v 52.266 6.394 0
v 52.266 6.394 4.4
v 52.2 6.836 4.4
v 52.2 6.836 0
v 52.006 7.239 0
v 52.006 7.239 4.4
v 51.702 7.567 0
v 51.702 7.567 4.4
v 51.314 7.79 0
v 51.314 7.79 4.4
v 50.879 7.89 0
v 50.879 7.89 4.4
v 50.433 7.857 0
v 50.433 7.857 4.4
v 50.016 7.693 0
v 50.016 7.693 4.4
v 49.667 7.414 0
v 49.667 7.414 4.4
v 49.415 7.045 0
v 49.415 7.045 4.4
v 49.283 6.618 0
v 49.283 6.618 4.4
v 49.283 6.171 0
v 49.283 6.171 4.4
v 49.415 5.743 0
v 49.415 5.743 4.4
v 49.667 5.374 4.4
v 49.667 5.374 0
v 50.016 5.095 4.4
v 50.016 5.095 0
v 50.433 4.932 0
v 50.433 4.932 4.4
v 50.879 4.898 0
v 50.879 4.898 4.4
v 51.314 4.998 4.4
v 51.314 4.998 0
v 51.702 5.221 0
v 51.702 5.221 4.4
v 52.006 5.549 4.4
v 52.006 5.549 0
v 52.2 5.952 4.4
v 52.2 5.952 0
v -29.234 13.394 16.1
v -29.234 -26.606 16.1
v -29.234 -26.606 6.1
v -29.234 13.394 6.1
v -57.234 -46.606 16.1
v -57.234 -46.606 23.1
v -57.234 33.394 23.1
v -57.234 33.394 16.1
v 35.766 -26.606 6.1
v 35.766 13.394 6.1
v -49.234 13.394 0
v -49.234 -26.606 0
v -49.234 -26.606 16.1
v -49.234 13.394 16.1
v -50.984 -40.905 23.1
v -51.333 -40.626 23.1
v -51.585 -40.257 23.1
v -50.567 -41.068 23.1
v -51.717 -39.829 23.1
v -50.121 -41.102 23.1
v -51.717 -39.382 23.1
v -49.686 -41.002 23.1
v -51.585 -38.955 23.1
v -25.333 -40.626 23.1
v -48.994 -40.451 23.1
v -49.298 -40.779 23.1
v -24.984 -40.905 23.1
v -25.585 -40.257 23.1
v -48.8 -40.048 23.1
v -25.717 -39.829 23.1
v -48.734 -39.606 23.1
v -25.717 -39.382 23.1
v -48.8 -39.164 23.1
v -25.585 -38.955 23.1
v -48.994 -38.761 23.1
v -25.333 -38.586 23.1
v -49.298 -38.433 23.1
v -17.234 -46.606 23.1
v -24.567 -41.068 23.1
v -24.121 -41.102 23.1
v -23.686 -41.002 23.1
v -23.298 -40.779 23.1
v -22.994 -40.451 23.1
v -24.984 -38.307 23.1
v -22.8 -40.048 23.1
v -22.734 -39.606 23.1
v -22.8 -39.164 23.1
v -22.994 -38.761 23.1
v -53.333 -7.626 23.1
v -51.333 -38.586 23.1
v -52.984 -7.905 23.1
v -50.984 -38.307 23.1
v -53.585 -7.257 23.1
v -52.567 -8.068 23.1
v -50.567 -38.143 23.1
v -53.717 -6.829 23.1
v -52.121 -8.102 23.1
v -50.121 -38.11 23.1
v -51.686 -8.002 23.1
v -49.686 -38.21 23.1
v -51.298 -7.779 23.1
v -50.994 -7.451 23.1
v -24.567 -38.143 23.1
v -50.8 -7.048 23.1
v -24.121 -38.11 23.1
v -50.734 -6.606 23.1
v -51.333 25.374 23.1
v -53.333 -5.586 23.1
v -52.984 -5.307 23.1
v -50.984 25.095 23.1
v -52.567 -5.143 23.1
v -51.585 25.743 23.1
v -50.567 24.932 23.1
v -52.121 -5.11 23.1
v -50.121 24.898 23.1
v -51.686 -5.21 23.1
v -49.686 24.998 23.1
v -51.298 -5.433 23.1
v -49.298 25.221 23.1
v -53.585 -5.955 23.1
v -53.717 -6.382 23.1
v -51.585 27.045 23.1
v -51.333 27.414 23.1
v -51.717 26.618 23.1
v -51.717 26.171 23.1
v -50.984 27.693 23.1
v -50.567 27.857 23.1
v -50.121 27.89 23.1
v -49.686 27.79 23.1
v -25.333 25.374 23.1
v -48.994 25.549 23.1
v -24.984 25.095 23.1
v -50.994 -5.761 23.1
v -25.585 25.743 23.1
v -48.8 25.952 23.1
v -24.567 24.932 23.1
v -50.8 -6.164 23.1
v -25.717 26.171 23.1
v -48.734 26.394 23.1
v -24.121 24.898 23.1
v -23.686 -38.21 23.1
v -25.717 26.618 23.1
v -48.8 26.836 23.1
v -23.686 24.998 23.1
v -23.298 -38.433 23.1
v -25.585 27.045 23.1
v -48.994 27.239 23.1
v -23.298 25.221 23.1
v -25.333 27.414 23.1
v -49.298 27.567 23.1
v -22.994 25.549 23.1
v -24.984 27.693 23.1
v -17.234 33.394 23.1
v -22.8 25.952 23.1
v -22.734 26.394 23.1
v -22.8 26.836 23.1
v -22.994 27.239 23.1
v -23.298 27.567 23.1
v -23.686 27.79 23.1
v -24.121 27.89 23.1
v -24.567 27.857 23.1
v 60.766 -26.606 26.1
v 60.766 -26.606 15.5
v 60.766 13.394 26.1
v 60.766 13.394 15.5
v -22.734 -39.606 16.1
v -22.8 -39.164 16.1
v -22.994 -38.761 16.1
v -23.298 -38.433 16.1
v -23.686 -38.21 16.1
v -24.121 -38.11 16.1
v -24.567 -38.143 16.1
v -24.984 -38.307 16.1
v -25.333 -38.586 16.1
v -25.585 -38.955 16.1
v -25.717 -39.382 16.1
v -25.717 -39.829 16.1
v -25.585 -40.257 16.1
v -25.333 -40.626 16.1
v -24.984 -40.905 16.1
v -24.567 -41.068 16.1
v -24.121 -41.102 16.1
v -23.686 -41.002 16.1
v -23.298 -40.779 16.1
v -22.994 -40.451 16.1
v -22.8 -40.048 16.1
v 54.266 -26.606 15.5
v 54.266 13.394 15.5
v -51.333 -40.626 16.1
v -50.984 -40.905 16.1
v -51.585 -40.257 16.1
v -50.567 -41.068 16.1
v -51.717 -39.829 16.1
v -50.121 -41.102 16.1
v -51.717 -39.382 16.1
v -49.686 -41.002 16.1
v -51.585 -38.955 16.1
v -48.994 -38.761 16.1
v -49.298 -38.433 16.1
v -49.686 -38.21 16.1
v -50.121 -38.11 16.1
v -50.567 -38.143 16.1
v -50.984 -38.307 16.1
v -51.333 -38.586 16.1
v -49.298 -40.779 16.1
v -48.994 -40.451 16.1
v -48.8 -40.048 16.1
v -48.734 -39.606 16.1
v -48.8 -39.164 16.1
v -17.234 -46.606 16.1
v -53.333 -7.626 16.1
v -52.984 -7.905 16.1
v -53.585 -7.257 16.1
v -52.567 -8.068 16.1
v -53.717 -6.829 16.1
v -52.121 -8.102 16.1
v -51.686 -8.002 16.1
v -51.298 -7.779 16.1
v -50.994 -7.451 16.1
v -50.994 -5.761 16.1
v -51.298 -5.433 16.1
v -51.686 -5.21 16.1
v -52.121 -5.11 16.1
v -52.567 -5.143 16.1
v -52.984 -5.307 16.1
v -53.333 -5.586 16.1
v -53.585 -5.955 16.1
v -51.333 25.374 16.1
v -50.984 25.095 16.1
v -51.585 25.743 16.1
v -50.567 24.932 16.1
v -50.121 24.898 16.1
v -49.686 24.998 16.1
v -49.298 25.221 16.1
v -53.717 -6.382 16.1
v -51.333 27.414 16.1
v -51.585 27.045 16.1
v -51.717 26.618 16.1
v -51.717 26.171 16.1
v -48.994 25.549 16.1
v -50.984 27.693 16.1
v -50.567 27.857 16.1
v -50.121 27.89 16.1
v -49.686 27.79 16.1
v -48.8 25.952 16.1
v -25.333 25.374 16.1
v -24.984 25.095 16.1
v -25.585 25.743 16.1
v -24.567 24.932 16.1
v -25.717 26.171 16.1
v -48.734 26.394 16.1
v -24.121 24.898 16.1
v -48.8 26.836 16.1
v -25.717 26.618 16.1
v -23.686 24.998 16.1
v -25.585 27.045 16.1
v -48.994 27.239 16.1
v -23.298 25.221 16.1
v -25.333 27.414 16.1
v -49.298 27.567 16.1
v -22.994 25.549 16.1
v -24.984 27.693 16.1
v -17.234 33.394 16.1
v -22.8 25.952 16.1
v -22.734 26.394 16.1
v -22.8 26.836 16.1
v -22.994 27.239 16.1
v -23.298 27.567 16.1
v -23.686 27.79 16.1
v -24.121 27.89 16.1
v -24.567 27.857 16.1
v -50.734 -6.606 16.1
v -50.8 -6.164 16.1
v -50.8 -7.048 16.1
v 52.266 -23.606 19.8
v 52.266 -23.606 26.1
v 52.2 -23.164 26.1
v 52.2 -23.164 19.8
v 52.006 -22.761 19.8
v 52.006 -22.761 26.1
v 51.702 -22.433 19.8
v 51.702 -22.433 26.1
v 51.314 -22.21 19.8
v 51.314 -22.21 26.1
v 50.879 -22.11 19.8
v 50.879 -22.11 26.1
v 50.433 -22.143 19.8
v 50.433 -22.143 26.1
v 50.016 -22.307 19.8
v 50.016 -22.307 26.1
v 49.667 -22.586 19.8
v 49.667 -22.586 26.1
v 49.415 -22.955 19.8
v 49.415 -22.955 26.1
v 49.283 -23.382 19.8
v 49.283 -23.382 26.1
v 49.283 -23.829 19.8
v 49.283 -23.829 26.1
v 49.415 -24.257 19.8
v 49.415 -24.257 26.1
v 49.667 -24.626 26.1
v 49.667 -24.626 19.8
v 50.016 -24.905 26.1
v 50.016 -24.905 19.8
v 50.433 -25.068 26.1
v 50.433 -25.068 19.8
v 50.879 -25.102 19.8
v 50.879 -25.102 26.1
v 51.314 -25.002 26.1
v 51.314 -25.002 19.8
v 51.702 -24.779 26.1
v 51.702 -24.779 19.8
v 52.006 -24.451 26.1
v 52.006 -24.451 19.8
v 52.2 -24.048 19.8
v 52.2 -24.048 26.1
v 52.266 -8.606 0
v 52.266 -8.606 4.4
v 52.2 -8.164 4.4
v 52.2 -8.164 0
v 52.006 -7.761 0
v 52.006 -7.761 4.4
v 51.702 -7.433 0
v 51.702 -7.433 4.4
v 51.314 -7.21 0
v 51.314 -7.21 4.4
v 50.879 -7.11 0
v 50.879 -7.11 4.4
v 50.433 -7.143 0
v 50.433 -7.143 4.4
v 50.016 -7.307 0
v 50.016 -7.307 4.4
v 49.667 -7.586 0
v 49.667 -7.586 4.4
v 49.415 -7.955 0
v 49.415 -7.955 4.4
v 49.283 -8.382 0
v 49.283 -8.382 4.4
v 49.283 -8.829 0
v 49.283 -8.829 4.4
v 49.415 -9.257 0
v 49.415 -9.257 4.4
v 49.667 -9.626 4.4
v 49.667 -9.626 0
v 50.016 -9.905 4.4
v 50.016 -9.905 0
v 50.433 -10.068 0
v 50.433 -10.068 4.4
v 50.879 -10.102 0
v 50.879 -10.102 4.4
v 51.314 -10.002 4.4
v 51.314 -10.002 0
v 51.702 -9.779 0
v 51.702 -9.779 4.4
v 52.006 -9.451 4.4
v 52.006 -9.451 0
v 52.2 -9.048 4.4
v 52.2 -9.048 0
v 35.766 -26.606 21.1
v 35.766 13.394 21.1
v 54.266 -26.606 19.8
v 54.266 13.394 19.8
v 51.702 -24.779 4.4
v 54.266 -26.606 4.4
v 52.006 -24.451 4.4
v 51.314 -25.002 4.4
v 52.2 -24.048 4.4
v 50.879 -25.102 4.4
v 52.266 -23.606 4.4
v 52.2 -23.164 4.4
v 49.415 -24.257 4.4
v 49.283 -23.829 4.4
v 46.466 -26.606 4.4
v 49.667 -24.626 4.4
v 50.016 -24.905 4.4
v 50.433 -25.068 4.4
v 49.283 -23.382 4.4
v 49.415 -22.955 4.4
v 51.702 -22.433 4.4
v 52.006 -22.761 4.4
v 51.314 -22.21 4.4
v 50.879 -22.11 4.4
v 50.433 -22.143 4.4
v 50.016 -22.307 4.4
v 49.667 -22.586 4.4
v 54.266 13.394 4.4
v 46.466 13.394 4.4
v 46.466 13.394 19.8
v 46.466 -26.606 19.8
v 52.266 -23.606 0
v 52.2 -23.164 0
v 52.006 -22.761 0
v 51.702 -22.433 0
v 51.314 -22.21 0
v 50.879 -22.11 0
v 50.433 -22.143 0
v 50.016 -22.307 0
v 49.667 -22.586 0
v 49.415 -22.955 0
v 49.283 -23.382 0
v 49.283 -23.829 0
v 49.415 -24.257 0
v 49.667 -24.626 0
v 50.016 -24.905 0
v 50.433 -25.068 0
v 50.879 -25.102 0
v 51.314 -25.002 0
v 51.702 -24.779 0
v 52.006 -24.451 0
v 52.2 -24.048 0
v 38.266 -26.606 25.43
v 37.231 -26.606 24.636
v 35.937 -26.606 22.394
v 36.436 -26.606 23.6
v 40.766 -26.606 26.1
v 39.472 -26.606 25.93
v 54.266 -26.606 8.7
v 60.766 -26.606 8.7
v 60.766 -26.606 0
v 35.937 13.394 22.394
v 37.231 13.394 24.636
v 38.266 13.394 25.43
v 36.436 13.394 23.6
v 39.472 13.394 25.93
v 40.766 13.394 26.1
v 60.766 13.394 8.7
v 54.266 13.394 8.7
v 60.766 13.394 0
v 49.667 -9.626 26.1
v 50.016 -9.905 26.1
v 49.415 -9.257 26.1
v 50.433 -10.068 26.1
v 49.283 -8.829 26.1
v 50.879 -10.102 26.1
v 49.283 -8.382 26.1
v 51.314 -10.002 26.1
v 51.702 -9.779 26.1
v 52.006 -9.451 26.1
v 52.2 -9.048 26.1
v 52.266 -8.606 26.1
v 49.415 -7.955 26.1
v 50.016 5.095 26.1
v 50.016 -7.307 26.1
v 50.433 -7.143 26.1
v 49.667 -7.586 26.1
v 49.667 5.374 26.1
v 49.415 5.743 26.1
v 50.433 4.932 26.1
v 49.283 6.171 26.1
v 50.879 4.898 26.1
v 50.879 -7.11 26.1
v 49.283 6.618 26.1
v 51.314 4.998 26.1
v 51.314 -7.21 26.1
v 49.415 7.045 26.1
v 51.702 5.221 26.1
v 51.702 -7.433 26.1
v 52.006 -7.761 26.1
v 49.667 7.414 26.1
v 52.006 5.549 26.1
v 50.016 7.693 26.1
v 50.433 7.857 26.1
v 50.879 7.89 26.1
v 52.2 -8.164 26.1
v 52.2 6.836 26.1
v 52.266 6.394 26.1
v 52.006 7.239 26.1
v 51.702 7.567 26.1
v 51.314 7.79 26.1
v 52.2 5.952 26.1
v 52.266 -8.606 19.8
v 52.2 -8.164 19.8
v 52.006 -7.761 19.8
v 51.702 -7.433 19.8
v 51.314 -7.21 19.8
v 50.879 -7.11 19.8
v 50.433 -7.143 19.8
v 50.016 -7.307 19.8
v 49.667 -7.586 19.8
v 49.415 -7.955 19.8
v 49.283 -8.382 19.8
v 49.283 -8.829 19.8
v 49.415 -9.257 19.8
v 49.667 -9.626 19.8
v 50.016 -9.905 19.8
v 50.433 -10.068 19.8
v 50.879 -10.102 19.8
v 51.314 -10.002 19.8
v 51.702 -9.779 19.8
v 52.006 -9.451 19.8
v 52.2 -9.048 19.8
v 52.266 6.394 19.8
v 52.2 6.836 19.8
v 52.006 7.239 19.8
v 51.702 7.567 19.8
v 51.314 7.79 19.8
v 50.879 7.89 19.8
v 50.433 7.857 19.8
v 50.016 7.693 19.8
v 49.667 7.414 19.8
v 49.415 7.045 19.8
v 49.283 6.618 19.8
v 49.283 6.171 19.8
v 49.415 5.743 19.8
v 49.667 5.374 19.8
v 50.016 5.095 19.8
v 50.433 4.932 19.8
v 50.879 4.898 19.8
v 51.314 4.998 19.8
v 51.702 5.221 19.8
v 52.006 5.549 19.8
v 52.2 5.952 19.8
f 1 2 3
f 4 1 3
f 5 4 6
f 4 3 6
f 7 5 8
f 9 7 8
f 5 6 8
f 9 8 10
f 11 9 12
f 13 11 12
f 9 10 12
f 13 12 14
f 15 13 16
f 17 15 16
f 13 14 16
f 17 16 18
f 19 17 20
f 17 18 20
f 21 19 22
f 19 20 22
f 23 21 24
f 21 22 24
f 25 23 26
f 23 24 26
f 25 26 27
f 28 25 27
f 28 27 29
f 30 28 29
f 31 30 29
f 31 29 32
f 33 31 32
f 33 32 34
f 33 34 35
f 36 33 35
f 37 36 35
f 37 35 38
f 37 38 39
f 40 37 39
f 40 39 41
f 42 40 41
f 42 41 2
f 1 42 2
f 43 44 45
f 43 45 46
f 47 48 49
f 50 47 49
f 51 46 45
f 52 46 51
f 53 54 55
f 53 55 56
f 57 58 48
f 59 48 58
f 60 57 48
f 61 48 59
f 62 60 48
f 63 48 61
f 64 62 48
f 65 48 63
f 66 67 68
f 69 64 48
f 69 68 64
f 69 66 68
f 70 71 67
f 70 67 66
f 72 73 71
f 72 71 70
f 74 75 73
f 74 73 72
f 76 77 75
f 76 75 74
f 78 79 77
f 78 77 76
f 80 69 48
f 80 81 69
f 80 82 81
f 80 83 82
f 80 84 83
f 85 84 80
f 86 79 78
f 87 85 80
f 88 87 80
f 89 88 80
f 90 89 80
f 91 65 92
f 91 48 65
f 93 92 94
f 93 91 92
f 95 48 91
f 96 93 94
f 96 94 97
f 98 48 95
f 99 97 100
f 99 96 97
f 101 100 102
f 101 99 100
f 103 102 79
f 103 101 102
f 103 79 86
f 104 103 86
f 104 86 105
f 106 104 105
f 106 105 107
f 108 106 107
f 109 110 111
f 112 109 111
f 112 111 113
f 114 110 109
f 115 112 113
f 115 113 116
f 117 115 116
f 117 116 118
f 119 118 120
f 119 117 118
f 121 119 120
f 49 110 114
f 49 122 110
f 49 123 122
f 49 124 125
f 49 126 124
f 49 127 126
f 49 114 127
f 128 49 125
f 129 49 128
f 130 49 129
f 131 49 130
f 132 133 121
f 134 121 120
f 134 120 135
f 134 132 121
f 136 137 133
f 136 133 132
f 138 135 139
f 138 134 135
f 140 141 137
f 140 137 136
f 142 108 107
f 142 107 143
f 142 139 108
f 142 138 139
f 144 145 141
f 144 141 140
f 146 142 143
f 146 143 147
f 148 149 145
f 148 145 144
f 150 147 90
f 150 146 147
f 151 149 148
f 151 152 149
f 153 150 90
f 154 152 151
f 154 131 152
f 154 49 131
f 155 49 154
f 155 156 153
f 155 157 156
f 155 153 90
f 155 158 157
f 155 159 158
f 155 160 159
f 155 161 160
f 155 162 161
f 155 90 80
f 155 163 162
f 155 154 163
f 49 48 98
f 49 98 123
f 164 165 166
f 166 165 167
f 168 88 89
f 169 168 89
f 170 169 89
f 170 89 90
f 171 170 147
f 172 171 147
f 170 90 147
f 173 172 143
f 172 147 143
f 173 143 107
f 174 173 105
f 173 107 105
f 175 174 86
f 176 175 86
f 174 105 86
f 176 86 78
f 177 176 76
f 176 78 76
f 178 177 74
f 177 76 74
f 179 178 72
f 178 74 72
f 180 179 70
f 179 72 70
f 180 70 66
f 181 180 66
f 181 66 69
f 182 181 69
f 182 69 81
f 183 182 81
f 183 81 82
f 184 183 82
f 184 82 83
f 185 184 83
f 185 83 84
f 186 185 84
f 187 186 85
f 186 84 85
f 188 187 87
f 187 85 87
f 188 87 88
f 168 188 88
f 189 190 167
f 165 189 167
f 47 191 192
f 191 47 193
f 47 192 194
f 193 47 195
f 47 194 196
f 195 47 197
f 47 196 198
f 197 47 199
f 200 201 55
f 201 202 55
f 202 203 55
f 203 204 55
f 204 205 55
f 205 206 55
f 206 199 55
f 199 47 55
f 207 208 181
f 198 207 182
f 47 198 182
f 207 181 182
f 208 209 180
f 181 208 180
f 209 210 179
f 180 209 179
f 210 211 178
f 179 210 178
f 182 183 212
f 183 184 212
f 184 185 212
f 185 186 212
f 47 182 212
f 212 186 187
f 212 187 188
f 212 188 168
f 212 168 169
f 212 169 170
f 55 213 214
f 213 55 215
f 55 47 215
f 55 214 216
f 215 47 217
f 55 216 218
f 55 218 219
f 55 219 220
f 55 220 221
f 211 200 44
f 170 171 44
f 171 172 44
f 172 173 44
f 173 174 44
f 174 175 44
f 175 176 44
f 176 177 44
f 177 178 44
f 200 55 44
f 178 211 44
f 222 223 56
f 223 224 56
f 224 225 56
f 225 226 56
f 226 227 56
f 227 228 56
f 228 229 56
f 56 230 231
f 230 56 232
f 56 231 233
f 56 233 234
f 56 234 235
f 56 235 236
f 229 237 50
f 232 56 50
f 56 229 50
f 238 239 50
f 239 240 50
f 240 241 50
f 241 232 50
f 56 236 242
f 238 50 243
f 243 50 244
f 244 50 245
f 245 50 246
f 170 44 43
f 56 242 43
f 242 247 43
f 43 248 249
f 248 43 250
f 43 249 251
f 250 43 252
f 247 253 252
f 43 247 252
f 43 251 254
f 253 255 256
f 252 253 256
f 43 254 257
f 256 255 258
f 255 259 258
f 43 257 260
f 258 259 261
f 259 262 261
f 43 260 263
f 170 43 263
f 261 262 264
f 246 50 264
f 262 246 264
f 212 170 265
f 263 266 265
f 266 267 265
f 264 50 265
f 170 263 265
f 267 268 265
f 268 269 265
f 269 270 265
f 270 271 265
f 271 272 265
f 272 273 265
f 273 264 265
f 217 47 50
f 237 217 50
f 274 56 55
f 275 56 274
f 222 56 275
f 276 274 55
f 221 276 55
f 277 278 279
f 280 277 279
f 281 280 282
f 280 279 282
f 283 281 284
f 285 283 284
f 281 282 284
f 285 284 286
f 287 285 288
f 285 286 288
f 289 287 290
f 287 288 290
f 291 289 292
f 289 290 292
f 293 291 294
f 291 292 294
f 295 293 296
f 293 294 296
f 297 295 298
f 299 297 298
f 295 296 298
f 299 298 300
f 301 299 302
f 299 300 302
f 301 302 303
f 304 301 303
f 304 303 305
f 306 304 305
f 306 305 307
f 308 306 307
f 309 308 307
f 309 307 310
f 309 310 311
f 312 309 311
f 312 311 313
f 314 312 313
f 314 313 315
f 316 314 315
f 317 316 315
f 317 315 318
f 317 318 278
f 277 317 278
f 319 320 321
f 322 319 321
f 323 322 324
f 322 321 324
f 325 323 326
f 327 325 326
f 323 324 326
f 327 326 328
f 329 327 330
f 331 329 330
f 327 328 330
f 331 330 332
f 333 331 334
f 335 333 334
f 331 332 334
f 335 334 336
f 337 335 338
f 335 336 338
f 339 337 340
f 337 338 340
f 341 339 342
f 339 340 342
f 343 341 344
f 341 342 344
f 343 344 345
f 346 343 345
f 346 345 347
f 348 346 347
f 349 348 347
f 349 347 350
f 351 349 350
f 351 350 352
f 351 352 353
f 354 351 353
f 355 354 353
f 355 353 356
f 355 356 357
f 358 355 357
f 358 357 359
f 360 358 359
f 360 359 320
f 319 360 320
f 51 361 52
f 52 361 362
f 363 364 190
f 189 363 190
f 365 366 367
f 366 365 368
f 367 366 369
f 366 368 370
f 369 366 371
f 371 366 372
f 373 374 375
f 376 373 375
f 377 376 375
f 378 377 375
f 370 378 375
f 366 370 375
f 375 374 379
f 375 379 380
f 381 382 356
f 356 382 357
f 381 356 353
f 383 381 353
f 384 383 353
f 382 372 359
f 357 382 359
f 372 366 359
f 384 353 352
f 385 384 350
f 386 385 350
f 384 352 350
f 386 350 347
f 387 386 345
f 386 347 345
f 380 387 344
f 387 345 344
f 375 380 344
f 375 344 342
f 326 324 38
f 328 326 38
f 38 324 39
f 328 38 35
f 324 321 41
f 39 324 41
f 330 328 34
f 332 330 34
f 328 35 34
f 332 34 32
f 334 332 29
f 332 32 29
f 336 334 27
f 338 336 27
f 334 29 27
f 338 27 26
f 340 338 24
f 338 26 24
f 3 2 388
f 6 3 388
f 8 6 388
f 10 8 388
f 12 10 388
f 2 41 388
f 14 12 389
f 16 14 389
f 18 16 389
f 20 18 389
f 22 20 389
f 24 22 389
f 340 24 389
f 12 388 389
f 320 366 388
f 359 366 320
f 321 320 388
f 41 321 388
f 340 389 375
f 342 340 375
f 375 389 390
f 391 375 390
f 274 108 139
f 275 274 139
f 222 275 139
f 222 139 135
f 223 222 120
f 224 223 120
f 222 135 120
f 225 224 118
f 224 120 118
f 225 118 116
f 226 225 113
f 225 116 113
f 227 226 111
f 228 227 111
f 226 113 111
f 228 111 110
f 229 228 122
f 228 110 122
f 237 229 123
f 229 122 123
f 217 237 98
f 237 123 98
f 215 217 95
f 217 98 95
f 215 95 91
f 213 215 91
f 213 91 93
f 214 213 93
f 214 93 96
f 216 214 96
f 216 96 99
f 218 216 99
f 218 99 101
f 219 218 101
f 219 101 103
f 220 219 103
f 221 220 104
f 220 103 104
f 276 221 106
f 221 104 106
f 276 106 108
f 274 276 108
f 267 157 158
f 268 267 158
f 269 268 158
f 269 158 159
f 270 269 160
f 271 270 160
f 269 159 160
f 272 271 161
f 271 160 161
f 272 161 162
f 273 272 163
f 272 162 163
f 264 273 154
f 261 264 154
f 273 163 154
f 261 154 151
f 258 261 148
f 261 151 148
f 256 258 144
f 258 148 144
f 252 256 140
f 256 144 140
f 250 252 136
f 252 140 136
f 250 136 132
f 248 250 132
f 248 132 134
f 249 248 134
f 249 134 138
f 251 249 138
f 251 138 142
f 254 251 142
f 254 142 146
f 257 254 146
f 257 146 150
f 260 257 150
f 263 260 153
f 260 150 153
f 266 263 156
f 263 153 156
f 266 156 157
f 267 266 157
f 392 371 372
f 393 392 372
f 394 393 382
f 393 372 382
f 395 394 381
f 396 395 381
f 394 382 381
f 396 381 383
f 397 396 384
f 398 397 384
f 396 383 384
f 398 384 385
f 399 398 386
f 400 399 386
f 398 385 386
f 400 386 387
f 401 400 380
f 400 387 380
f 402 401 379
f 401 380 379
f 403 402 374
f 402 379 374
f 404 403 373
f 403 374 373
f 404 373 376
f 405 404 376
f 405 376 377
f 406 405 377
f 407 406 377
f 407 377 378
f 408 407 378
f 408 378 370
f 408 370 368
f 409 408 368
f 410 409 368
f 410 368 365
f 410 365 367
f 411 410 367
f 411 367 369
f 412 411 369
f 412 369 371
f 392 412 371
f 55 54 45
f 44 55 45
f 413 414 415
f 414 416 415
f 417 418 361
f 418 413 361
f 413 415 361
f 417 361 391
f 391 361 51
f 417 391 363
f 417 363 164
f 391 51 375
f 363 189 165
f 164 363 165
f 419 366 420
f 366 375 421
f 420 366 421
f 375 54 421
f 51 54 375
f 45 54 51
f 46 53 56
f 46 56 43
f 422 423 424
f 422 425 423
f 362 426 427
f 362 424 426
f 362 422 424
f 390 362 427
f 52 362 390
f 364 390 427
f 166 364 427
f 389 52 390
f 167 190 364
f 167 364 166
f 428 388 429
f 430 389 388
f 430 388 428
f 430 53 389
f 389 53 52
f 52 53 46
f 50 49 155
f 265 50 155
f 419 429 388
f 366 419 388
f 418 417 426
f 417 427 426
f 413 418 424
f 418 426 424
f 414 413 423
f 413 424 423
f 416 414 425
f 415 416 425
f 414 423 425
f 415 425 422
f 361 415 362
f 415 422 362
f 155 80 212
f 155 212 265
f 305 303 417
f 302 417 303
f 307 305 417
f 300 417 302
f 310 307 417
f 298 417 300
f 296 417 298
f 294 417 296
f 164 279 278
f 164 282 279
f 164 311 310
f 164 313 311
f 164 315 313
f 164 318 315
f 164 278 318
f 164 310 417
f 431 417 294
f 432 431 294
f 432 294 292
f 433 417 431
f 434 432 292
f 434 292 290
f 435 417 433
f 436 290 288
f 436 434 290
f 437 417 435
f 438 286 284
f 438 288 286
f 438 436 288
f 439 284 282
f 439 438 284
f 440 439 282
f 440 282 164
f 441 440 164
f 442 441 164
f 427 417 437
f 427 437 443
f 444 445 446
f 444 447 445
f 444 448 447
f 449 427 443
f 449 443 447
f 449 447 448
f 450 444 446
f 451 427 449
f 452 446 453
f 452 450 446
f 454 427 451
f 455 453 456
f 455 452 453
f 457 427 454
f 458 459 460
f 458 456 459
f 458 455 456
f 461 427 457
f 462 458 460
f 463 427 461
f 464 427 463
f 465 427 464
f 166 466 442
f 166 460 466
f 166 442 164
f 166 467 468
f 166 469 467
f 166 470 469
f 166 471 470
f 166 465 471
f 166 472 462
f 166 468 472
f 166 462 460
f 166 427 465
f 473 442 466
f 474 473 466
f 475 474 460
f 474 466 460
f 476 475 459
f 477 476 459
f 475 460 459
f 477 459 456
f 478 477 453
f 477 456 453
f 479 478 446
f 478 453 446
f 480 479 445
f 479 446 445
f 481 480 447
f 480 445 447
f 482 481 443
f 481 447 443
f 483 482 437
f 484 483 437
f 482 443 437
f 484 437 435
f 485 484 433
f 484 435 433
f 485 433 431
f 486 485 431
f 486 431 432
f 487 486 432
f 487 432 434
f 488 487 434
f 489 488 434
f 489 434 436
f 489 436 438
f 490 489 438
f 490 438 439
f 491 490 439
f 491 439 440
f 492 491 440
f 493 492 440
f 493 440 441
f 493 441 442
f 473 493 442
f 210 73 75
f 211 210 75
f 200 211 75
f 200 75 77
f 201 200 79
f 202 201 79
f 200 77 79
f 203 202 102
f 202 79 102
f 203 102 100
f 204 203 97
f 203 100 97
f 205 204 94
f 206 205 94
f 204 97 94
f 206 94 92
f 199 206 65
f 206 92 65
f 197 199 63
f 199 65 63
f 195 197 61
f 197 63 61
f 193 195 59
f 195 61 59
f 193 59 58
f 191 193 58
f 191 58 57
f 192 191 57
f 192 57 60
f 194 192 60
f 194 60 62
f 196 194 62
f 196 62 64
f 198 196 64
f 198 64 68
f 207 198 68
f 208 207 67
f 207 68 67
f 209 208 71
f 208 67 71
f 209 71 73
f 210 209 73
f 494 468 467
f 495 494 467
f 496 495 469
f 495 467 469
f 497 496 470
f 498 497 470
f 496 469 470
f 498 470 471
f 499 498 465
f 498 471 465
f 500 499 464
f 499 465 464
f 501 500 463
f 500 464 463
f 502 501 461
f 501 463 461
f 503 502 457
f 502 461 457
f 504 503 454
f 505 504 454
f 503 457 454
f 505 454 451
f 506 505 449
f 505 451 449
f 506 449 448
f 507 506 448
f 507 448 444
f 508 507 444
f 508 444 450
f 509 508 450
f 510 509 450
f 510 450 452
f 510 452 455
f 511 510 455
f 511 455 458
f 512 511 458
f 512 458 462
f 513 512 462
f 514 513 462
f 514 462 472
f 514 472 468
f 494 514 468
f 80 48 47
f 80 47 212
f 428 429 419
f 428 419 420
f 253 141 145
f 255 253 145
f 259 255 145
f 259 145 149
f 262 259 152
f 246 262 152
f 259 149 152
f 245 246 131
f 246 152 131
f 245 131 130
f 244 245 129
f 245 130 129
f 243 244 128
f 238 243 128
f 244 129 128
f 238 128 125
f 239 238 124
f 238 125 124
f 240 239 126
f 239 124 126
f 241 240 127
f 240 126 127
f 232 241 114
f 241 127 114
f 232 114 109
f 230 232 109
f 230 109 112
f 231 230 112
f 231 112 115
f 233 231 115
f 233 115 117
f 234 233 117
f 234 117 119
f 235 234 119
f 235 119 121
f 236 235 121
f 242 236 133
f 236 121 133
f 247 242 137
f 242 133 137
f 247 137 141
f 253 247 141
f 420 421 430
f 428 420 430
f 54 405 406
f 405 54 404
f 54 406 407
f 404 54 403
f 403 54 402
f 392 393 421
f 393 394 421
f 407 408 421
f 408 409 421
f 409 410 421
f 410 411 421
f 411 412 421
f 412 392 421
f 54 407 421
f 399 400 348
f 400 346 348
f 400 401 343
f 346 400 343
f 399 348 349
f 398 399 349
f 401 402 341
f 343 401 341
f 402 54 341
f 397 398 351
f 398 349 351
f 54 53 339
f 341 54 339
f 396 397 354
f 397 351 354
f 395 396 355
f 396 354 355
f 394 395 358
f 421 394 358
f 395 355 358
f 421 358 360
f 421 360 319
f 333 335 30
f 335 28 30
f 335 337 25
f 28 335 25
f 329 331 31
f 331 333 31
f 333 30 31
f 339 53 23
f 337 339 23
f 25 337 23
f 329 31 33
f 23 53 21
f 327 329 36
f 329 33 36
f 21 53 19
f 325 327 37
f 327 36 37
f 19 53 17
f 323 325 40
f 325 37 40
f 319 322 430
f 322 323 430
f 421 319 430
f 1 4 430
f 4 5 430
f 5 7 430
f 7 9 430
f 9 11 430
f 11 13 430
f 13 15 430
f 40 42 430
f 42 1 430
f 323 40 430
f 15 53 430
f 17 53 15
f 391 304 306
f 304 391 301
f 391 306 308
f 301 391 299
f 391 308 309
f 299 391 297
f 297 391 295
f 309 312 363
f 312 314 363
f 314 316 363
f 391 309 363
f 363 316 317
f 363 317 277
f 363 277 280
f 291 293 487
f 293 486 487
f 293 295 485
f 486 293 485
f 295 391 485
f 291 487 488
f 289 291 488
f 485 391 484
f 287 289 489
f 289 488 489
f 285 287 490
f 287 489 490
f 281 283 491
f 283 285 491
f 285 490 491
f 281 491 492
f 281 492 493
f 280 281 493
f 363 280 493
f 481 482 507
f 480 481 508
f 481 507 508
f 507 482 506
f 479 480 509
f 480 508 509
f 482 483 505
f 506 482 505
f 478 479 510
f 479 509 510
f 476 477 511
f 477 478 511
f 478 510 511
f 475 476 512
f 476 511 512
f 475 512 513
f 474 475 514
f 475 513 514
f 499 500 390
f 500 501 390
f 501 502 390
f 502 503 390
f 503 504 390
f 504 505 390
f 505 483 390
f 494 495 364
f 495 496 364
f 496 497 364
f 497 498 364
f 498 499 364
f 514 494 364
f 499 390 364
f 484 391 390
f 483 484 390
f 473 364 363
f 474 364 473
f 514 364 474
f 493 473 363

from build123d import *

# Parameters (mm, degrees)
SKETCH1_W           = 110
SKETCH1_H           = 40
BOSS_EXTRUDE1_DEPTH = 26.1
SKETCH2_W           = 6.5
SKETCH2_H           = 6.8
CUT_EXTRUDE1_DEPTH  = 41
SKETCH3_W           = 65
SKETCH3_H           = 40
CUT_EXTRUDE2_DEPTH  = 20
SKETCH5_R           = 1.5
CUT_EXTRUDE3_DEPTH  = 27.1
FILLET1_R           = 5
SKETCH8_W           = 20
SKETCH8_H           = 40
CUT_EXTRUDE4_DEPTH  = 3
SKETCH9_W           = 40
SKETCH9_H           = 80
BOSS_EXTRUDE3_DEPTH = 7
SKETCH10_R          = 1.5
CUT_EXTRUDE5_DEPTH  = 7


with BuildPart() as part:
    # Sketch1 → Boss-Extrude1 (new body)
    with BuildSketch(Plane.XY):
        with Locations((5.766423358, -6.605839416)):
            Rectangle(SKETCH1_W, SKETCH1_H)
    extrude(amount=BOSS_EXTRUDE1_DEPTH)

    # Sketch2 → Cut-Extrude1 (cut, through all)
    with BuildSketch(Plane(origin=(0, 13.394160584, 0), x_dir=(1, 0, 0), z_dir=(0, 1, 0))):
        with Locations((57.516423358, -12.1)):
            Rectangle(SKETCH2_W, SKETCH2_H)
        Polygon((54.266423358, -19.8), (54.266423358, -15.5), (54.266423358, -8.7), (54.266423358, -4.4), (46.466423358, -4.4), (46.466423358, -19.8), align=None)
    extrude(amount=-CUT_EXTRUDE1_DEPTH, mode=Mode.SUBTRACT)

    # Sketch3 → Cut-Extrude2 (cut)
    with BuildSketch(Plane.XY.offset(26.1)):
        with Locations((3.266423358, -6.605839416)):
            Rectangle(SKETCH3_W, SKETCH3_H)
    extrude(amount=-CUT_EXTRUDE2_DEPTH, mode=Mode.SUBTRACT)

    # Sketch5 → Cut-Extrude3 (cut, through all)
    with BuildSketch(Plane.XY.offset(26.1)):
        with Locations((50.766423358, 6.394160584)):
            Circle(SKETCH5_R)
        with Locations((50.766423358, -8.605839416)):
            Circle(SKETCH5_R)
        with Locations((50.766423358, -23.605839416)):
            Circle(SKETCH5_R)
    extrude(amount=-CUT_EXTRUDE3_DEPTH, mode=Mode.SUBTRACT)

    # Fillet1
    fillet1_edges = [part.edges().sort_by_distance(p)[0] for p in [
        (35.766423358, -6.605839416, 26.1),
    ]]
    fillet(fillet1_edges, radius=FILLET1_R)

    # Sketch8 → Cut-Extrude4 (cut)
    with BuildSketch(Plane.XY.offset(26.1)):
        with Locations((-39.233576642, -6.605839416)):
            Rectangle(SKETCH8_W, SKETCH8_H)
    extrude(amount=-CUT_EXTRUDE4_DEPTH, mode=Mode.SUBTRACT)

    # Sketch9 → Boss-Extrude3 (add)
    with BuildSketch(Plane.XY.offset(23.1)):
        with Locations((-37.233576642, -6.605839416)):
            Rectangle(SKETCH9_W, SKETCH9_H)
    extrude(amount=-BOSS_EXTRUDE3_DEPTH)

    # Sketch10 → Cut-Extrude5 (cut)
    with BuildSketch(Plane.XY.offset(23.1)):
        with Locations((-24.233576642, 26.394160584)):
            Circle(SKETCH10_R)
        with Locations((-50.233576642, 26.394160584)):
            Circle(SKETCH10_R)
        with Locations((-52.233576642, -6.605839416)):
            Circle(SKETCH10_R)
        with Locations((-50.233576642, -39.605839416)):
            Circle(SKETCH10_R)
        with Locations((-24.233576642, -39.605839416)):
            Circle(SKETCH10_R)
    extrude(amount=-CUT_EXTRUDE5_DEPTH, mode=Mode.SUBTRACT)


solid = part.part
